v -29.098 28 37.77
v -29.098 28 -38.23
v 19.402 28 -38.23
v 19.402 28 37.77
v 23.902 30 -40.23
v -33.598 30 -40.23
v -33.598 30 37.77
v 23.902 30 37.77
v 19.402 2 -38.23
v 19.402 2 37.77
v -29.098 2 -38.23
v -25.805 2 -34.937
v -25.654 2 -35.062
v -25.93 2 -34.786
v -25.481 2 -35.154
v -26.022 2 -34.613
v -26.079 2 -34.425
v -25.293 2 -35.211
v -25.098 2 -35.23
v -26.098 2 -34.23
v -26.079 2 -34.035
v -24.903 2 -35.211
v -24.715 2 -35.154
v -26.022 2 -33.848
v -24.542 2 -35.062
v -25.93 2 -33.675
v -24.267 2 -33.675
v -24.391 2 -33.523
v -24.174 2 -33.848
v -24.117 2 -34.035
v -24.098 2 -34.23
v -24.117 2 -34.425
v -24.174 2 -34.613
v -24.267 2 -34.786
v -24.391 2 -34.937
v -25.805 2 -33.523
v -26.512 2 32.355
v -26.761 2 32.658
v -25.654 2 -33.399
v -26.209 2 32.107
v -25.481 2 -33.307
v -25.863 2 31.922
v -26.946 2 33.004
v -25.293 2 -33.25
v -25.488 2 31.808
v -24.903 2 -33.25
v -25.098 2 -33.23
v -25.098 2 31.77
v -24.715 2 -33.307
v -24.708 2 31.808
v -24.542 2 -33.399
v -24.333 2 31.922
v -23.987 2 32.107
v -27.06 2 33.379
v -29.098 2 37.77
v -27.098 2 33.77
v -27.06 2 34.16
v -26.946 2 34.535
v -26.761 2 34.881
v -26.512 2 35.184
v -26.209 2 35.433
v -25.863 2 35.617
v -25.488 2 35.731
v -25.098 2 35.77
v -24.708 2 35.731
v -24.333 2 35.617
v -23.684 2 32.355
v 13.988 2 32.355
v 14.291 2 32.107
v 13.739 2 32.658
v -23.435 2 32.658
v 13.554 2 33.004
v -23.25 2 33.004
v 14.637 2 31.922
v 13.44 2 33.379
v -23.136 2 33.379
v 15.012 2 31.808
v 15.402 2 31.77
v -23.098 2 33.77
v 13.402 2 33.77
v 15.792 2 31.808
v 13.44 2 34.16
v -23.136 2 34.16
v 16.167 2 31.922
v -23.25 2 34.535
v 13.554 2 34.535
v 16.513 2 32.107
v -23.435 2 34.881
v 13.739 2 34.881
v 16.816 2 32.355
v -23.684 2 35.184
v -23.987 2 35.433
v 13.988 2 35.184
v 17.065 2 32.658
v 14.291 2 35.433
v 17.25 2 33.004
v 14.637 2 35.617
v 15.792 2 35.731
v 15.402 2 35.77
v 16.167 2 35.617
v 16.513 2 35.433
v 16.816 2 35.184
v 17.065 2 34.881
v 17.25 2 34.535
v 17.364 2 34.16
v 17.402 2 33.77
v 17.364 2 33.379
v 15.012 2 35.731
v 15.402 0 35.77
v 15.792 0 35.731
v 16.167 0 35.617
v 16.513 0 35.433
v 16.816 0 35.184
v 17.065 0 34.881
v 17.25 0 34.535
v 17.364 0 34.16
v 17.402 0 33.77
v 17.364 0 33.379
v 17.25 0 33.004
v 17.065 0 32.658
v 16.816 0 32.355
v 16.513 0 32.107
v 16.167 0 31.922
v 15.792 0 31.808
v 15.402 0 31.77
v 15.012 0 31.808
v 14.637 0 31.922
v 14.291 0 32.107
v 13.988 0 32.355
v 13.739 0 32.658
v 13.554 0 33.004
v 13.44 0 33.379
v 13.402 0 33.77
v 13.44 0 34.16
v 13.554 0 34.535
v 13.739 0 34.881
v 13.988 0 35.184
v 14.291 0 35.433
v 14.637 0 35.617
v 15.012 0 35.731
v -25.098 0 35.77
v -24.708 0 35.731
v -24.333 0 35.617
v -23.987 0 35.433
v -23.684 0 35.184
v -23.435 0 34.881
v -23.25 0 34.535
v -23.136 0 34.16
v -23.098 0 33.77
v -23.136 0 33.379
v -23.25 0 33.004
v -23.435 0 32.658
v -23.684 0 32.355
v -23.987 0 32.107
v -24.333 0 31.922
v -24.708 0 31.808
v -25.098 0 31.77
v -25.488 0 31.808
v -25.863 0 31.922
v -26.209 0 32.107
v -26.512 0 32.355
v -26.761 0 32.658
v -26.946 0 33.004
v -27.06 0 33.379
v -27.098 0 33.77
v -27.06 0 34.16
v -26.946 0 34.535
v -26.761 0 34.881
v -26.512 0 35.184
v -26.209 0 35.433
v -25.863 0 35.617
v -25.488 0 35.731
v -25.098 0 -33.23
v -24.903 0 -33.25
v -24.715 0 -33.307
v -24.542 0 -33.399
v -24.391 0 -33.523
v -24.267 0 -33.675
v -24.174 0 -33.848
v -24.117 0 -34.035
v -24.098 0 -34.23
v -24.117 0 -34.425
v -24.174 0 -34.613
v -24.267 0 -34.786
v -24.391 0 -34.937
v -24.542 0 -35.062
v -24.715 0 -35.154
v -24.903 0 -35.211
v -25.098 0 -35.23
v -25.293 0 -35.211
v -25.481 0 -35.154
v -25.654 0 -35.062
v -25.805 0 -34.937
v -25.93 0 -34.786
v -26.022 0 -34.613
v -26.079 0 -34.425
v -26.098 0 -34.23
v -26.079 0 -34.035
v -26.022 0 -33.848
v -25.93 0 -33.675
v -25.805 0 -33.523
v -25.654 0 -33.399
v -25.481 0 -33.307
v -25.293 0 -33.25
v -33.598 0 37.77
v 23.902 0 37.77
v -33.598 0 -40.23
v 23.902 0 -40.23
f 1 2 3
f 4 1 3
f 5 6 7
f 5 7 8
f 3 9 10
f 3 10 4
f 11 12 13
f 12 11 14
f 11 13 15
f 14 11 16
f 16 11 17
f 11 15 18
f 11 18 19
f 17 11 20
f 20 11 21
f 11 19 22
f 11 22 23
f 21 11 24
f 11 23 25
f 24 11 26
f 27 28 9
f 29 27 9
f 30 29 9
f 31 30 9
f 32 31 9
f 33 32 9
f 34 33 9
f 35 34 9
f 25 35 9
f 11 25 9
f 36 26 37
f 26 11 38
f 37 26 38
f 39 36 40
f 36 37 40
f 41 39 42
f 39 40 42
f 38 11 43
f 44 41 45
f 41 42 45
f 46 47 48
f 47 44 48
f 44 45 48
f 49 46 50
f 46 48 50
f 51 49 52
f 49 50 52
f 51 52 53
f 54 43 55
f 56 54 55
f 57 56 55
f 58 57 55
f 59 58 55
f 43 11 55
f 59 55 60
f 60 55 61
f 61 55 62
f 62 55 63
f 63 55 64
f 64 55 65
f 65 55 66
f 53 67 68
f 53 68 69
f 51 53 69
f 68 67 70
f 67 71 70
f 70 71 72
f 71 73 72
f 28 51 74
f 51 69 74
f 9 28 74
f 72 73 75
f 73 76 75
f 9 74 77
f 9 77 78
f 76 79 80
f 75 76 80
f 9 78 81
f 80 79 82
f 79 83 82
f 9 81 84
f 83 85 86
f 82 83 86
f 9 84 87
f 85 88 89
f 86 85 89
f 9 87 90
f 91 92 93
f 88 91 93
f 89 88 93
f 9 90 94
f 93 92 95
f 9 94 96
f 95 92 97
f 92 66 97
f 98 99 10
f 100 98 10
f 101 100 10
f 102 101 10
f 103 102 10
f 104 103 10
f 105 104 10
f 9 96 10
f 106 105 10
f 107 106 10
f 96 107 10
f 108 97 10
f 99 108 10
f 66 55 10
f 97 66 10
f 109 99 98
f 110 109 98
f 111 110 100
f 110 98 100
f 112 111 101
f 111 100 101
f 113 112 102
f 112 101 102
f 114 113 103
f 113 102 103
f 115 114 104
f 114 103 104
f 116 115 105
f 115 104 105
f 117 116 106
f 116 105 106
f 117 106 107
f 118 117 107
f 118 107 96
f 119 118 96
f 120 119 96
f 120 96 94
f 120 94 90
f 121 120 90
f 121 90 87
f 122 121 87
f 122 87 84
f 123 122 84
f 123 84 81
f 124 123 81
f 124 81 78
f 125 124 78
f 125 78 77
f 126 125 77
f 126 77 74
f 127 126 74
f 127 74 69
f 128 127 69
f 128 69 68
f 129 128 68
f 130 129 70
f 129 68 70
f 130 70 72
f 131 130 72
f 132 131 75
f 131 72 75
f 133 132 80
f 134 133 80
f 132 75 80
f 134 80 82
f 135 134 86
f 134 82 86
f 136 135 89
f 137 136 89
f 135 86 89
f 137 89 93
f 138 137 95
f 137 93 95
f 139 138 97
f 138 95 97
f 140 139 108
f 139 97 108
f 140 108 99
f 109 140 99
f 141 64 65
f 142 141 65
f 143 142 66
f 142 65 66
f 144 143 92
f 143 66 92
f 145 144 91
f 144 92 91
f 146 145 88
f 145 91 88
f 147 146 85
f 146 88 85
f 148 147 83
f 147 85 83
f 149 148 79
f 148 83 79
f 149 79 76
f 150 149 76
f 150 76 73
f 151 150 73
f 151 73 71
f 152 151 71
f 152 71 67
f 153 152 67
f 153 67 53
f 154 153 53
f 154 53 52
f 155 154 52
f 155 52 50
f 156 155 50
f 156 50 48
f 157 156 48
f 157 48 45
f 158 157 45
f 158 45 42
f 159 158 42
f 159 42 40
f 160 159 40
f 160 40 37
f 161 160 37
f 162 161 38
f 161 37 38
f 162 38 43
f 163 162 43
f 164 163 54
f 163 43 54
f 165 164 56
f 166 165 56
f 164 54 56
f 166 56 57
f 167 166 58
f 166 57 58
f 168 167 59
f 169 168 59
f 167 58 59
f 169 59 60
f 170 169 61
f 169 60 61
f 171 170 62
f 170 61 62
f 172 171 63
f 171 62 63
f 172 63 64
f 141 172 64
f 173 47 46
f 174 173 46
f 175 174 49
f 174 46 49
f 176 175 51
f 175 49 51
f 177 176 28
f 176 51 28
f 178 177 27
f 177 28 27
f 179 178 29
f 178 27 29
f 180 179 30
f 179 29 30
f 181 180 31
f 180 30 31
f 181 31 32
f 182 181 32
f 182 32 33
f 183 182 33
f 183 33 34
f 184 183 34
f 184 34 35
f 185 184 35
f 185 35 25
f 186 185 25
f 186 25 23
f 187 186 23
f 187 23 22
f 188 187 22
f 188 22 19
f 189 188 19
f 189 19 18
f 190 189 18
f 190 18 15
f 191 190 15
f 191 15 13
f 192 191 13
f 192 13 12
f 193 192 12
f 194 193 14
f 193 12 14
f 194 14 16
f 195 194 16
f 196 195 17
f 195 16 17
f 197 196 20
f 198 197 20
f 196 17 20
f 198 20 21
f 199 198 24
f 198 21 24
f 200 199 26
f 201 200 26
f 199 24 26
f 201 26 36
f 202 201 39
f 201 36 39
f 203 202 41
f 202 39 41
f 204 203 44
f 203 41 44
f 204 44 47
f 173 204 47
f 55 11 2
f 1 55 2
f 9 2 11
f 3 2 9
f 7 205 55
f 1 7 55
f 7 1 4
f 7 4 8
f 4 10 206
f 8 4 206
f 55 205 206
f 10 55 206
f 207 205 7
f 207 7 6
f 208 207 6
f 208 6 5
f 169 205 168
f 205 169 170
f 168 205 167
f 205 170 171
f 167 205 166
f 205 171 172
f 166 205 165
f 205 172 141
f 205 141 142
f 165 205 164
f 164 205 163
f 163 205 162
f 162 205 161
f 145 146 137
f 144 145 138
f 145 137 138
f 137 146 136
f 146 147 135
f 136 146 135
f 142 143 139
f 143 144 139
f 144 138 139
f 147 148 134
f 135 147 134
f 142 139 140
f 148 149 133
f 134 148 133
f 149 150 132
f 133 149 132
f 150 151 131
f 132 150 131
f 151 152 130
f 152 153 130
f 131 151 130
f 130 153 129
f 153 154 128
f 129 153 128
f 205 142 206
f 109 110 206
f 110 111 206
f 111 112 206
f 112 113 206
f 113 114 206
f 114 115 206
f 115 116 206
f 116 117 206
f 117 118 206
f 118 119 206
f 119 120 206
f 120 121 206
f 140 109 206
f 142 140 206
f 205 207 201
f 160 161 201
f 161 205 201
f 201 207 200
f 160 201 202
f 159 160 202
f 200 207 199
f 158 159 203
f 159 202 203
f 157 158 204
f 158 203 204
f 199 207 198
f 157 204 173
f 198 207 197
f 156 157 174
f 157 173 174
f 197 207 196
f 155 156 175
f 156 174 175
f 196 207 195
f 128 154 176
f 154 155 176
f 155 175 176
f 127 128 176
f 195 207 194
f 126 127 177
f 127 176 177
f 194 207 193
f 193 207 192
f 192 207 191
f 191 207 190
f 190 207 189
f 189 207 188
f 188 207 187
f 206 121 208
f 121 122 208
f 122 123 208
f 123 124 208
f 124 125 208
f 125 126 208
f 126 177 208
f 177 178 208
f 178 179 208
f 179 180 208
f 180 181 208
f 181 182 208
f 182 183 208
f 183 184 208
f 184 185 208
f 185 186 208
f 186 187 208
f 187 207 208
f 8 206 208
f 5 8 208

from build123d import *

# Parameters (mm, degrees)
SKETCH1_W           = 57.5
SKETCH1_H           = 78
BOSS_EXTRUDE1_DEPTH = 30
SKETCH2_W           = 48.5
SKETCH2_H           = 26
CUT_EXTRUDE1_DEPTH  = 76
SKETCH3_R           = 2
SKETCH3_R_2         = 1
CUT_EXTRUDE2_DEPTH  = 60.424849114


with BuildPart() as part:
    # Sketch1 → Boss-Extrude1 (new body)
    with BuildSketch(Plane(origin=(0, 0, 0), x_dir=(1, 0, 0), z_dir=(0, 1, 0))):
        with Locations((-4.848039216, 1.230392157)):
            Rectangle(SKETCH1_W, SKETCH1_H)
    extrude(amount=BOSS_EXTRUDE1_DEPTH)

    # Sketch2 → Cut-Extrude1 (cut)
    with BuildSketch(Plane.XY.offset(37.769607843)):
        with Locations((-4.848039216, 15)):
            Rectangle(SKETCH2_W, SKETCH2_H)
    extrude(amount=-CUT_EXTRUDE1_DEPTH, mode=Mode.SUBTRACT)

    # Sketch3 → Cut-Extrude2 (cut, through all)
    with BuildSketch(Plane(origin=(0, 2, 0), x_dir=(1, 0, 0), z_dir=(0, 1, 0))):
        with Locations(Location((15.401960784, -33.769607843, 0), (0, 0, 270))):
            Circle(SKETCH3_R)
        with Locations(Location((-25.098039216, 34.230392157, 0), (0, 0, 270))):
            Circle(SKETCH3_R_2)
        with Locations(Location((-25.098039216, -33.769607843, 0), (0, 0, 270))):
            Circle(SKETCH3_R)
    extrude(amount=-CUT_EXTRUDE2_DEPTH, mode=Mode.SUBTRACT)


solid = part.part
